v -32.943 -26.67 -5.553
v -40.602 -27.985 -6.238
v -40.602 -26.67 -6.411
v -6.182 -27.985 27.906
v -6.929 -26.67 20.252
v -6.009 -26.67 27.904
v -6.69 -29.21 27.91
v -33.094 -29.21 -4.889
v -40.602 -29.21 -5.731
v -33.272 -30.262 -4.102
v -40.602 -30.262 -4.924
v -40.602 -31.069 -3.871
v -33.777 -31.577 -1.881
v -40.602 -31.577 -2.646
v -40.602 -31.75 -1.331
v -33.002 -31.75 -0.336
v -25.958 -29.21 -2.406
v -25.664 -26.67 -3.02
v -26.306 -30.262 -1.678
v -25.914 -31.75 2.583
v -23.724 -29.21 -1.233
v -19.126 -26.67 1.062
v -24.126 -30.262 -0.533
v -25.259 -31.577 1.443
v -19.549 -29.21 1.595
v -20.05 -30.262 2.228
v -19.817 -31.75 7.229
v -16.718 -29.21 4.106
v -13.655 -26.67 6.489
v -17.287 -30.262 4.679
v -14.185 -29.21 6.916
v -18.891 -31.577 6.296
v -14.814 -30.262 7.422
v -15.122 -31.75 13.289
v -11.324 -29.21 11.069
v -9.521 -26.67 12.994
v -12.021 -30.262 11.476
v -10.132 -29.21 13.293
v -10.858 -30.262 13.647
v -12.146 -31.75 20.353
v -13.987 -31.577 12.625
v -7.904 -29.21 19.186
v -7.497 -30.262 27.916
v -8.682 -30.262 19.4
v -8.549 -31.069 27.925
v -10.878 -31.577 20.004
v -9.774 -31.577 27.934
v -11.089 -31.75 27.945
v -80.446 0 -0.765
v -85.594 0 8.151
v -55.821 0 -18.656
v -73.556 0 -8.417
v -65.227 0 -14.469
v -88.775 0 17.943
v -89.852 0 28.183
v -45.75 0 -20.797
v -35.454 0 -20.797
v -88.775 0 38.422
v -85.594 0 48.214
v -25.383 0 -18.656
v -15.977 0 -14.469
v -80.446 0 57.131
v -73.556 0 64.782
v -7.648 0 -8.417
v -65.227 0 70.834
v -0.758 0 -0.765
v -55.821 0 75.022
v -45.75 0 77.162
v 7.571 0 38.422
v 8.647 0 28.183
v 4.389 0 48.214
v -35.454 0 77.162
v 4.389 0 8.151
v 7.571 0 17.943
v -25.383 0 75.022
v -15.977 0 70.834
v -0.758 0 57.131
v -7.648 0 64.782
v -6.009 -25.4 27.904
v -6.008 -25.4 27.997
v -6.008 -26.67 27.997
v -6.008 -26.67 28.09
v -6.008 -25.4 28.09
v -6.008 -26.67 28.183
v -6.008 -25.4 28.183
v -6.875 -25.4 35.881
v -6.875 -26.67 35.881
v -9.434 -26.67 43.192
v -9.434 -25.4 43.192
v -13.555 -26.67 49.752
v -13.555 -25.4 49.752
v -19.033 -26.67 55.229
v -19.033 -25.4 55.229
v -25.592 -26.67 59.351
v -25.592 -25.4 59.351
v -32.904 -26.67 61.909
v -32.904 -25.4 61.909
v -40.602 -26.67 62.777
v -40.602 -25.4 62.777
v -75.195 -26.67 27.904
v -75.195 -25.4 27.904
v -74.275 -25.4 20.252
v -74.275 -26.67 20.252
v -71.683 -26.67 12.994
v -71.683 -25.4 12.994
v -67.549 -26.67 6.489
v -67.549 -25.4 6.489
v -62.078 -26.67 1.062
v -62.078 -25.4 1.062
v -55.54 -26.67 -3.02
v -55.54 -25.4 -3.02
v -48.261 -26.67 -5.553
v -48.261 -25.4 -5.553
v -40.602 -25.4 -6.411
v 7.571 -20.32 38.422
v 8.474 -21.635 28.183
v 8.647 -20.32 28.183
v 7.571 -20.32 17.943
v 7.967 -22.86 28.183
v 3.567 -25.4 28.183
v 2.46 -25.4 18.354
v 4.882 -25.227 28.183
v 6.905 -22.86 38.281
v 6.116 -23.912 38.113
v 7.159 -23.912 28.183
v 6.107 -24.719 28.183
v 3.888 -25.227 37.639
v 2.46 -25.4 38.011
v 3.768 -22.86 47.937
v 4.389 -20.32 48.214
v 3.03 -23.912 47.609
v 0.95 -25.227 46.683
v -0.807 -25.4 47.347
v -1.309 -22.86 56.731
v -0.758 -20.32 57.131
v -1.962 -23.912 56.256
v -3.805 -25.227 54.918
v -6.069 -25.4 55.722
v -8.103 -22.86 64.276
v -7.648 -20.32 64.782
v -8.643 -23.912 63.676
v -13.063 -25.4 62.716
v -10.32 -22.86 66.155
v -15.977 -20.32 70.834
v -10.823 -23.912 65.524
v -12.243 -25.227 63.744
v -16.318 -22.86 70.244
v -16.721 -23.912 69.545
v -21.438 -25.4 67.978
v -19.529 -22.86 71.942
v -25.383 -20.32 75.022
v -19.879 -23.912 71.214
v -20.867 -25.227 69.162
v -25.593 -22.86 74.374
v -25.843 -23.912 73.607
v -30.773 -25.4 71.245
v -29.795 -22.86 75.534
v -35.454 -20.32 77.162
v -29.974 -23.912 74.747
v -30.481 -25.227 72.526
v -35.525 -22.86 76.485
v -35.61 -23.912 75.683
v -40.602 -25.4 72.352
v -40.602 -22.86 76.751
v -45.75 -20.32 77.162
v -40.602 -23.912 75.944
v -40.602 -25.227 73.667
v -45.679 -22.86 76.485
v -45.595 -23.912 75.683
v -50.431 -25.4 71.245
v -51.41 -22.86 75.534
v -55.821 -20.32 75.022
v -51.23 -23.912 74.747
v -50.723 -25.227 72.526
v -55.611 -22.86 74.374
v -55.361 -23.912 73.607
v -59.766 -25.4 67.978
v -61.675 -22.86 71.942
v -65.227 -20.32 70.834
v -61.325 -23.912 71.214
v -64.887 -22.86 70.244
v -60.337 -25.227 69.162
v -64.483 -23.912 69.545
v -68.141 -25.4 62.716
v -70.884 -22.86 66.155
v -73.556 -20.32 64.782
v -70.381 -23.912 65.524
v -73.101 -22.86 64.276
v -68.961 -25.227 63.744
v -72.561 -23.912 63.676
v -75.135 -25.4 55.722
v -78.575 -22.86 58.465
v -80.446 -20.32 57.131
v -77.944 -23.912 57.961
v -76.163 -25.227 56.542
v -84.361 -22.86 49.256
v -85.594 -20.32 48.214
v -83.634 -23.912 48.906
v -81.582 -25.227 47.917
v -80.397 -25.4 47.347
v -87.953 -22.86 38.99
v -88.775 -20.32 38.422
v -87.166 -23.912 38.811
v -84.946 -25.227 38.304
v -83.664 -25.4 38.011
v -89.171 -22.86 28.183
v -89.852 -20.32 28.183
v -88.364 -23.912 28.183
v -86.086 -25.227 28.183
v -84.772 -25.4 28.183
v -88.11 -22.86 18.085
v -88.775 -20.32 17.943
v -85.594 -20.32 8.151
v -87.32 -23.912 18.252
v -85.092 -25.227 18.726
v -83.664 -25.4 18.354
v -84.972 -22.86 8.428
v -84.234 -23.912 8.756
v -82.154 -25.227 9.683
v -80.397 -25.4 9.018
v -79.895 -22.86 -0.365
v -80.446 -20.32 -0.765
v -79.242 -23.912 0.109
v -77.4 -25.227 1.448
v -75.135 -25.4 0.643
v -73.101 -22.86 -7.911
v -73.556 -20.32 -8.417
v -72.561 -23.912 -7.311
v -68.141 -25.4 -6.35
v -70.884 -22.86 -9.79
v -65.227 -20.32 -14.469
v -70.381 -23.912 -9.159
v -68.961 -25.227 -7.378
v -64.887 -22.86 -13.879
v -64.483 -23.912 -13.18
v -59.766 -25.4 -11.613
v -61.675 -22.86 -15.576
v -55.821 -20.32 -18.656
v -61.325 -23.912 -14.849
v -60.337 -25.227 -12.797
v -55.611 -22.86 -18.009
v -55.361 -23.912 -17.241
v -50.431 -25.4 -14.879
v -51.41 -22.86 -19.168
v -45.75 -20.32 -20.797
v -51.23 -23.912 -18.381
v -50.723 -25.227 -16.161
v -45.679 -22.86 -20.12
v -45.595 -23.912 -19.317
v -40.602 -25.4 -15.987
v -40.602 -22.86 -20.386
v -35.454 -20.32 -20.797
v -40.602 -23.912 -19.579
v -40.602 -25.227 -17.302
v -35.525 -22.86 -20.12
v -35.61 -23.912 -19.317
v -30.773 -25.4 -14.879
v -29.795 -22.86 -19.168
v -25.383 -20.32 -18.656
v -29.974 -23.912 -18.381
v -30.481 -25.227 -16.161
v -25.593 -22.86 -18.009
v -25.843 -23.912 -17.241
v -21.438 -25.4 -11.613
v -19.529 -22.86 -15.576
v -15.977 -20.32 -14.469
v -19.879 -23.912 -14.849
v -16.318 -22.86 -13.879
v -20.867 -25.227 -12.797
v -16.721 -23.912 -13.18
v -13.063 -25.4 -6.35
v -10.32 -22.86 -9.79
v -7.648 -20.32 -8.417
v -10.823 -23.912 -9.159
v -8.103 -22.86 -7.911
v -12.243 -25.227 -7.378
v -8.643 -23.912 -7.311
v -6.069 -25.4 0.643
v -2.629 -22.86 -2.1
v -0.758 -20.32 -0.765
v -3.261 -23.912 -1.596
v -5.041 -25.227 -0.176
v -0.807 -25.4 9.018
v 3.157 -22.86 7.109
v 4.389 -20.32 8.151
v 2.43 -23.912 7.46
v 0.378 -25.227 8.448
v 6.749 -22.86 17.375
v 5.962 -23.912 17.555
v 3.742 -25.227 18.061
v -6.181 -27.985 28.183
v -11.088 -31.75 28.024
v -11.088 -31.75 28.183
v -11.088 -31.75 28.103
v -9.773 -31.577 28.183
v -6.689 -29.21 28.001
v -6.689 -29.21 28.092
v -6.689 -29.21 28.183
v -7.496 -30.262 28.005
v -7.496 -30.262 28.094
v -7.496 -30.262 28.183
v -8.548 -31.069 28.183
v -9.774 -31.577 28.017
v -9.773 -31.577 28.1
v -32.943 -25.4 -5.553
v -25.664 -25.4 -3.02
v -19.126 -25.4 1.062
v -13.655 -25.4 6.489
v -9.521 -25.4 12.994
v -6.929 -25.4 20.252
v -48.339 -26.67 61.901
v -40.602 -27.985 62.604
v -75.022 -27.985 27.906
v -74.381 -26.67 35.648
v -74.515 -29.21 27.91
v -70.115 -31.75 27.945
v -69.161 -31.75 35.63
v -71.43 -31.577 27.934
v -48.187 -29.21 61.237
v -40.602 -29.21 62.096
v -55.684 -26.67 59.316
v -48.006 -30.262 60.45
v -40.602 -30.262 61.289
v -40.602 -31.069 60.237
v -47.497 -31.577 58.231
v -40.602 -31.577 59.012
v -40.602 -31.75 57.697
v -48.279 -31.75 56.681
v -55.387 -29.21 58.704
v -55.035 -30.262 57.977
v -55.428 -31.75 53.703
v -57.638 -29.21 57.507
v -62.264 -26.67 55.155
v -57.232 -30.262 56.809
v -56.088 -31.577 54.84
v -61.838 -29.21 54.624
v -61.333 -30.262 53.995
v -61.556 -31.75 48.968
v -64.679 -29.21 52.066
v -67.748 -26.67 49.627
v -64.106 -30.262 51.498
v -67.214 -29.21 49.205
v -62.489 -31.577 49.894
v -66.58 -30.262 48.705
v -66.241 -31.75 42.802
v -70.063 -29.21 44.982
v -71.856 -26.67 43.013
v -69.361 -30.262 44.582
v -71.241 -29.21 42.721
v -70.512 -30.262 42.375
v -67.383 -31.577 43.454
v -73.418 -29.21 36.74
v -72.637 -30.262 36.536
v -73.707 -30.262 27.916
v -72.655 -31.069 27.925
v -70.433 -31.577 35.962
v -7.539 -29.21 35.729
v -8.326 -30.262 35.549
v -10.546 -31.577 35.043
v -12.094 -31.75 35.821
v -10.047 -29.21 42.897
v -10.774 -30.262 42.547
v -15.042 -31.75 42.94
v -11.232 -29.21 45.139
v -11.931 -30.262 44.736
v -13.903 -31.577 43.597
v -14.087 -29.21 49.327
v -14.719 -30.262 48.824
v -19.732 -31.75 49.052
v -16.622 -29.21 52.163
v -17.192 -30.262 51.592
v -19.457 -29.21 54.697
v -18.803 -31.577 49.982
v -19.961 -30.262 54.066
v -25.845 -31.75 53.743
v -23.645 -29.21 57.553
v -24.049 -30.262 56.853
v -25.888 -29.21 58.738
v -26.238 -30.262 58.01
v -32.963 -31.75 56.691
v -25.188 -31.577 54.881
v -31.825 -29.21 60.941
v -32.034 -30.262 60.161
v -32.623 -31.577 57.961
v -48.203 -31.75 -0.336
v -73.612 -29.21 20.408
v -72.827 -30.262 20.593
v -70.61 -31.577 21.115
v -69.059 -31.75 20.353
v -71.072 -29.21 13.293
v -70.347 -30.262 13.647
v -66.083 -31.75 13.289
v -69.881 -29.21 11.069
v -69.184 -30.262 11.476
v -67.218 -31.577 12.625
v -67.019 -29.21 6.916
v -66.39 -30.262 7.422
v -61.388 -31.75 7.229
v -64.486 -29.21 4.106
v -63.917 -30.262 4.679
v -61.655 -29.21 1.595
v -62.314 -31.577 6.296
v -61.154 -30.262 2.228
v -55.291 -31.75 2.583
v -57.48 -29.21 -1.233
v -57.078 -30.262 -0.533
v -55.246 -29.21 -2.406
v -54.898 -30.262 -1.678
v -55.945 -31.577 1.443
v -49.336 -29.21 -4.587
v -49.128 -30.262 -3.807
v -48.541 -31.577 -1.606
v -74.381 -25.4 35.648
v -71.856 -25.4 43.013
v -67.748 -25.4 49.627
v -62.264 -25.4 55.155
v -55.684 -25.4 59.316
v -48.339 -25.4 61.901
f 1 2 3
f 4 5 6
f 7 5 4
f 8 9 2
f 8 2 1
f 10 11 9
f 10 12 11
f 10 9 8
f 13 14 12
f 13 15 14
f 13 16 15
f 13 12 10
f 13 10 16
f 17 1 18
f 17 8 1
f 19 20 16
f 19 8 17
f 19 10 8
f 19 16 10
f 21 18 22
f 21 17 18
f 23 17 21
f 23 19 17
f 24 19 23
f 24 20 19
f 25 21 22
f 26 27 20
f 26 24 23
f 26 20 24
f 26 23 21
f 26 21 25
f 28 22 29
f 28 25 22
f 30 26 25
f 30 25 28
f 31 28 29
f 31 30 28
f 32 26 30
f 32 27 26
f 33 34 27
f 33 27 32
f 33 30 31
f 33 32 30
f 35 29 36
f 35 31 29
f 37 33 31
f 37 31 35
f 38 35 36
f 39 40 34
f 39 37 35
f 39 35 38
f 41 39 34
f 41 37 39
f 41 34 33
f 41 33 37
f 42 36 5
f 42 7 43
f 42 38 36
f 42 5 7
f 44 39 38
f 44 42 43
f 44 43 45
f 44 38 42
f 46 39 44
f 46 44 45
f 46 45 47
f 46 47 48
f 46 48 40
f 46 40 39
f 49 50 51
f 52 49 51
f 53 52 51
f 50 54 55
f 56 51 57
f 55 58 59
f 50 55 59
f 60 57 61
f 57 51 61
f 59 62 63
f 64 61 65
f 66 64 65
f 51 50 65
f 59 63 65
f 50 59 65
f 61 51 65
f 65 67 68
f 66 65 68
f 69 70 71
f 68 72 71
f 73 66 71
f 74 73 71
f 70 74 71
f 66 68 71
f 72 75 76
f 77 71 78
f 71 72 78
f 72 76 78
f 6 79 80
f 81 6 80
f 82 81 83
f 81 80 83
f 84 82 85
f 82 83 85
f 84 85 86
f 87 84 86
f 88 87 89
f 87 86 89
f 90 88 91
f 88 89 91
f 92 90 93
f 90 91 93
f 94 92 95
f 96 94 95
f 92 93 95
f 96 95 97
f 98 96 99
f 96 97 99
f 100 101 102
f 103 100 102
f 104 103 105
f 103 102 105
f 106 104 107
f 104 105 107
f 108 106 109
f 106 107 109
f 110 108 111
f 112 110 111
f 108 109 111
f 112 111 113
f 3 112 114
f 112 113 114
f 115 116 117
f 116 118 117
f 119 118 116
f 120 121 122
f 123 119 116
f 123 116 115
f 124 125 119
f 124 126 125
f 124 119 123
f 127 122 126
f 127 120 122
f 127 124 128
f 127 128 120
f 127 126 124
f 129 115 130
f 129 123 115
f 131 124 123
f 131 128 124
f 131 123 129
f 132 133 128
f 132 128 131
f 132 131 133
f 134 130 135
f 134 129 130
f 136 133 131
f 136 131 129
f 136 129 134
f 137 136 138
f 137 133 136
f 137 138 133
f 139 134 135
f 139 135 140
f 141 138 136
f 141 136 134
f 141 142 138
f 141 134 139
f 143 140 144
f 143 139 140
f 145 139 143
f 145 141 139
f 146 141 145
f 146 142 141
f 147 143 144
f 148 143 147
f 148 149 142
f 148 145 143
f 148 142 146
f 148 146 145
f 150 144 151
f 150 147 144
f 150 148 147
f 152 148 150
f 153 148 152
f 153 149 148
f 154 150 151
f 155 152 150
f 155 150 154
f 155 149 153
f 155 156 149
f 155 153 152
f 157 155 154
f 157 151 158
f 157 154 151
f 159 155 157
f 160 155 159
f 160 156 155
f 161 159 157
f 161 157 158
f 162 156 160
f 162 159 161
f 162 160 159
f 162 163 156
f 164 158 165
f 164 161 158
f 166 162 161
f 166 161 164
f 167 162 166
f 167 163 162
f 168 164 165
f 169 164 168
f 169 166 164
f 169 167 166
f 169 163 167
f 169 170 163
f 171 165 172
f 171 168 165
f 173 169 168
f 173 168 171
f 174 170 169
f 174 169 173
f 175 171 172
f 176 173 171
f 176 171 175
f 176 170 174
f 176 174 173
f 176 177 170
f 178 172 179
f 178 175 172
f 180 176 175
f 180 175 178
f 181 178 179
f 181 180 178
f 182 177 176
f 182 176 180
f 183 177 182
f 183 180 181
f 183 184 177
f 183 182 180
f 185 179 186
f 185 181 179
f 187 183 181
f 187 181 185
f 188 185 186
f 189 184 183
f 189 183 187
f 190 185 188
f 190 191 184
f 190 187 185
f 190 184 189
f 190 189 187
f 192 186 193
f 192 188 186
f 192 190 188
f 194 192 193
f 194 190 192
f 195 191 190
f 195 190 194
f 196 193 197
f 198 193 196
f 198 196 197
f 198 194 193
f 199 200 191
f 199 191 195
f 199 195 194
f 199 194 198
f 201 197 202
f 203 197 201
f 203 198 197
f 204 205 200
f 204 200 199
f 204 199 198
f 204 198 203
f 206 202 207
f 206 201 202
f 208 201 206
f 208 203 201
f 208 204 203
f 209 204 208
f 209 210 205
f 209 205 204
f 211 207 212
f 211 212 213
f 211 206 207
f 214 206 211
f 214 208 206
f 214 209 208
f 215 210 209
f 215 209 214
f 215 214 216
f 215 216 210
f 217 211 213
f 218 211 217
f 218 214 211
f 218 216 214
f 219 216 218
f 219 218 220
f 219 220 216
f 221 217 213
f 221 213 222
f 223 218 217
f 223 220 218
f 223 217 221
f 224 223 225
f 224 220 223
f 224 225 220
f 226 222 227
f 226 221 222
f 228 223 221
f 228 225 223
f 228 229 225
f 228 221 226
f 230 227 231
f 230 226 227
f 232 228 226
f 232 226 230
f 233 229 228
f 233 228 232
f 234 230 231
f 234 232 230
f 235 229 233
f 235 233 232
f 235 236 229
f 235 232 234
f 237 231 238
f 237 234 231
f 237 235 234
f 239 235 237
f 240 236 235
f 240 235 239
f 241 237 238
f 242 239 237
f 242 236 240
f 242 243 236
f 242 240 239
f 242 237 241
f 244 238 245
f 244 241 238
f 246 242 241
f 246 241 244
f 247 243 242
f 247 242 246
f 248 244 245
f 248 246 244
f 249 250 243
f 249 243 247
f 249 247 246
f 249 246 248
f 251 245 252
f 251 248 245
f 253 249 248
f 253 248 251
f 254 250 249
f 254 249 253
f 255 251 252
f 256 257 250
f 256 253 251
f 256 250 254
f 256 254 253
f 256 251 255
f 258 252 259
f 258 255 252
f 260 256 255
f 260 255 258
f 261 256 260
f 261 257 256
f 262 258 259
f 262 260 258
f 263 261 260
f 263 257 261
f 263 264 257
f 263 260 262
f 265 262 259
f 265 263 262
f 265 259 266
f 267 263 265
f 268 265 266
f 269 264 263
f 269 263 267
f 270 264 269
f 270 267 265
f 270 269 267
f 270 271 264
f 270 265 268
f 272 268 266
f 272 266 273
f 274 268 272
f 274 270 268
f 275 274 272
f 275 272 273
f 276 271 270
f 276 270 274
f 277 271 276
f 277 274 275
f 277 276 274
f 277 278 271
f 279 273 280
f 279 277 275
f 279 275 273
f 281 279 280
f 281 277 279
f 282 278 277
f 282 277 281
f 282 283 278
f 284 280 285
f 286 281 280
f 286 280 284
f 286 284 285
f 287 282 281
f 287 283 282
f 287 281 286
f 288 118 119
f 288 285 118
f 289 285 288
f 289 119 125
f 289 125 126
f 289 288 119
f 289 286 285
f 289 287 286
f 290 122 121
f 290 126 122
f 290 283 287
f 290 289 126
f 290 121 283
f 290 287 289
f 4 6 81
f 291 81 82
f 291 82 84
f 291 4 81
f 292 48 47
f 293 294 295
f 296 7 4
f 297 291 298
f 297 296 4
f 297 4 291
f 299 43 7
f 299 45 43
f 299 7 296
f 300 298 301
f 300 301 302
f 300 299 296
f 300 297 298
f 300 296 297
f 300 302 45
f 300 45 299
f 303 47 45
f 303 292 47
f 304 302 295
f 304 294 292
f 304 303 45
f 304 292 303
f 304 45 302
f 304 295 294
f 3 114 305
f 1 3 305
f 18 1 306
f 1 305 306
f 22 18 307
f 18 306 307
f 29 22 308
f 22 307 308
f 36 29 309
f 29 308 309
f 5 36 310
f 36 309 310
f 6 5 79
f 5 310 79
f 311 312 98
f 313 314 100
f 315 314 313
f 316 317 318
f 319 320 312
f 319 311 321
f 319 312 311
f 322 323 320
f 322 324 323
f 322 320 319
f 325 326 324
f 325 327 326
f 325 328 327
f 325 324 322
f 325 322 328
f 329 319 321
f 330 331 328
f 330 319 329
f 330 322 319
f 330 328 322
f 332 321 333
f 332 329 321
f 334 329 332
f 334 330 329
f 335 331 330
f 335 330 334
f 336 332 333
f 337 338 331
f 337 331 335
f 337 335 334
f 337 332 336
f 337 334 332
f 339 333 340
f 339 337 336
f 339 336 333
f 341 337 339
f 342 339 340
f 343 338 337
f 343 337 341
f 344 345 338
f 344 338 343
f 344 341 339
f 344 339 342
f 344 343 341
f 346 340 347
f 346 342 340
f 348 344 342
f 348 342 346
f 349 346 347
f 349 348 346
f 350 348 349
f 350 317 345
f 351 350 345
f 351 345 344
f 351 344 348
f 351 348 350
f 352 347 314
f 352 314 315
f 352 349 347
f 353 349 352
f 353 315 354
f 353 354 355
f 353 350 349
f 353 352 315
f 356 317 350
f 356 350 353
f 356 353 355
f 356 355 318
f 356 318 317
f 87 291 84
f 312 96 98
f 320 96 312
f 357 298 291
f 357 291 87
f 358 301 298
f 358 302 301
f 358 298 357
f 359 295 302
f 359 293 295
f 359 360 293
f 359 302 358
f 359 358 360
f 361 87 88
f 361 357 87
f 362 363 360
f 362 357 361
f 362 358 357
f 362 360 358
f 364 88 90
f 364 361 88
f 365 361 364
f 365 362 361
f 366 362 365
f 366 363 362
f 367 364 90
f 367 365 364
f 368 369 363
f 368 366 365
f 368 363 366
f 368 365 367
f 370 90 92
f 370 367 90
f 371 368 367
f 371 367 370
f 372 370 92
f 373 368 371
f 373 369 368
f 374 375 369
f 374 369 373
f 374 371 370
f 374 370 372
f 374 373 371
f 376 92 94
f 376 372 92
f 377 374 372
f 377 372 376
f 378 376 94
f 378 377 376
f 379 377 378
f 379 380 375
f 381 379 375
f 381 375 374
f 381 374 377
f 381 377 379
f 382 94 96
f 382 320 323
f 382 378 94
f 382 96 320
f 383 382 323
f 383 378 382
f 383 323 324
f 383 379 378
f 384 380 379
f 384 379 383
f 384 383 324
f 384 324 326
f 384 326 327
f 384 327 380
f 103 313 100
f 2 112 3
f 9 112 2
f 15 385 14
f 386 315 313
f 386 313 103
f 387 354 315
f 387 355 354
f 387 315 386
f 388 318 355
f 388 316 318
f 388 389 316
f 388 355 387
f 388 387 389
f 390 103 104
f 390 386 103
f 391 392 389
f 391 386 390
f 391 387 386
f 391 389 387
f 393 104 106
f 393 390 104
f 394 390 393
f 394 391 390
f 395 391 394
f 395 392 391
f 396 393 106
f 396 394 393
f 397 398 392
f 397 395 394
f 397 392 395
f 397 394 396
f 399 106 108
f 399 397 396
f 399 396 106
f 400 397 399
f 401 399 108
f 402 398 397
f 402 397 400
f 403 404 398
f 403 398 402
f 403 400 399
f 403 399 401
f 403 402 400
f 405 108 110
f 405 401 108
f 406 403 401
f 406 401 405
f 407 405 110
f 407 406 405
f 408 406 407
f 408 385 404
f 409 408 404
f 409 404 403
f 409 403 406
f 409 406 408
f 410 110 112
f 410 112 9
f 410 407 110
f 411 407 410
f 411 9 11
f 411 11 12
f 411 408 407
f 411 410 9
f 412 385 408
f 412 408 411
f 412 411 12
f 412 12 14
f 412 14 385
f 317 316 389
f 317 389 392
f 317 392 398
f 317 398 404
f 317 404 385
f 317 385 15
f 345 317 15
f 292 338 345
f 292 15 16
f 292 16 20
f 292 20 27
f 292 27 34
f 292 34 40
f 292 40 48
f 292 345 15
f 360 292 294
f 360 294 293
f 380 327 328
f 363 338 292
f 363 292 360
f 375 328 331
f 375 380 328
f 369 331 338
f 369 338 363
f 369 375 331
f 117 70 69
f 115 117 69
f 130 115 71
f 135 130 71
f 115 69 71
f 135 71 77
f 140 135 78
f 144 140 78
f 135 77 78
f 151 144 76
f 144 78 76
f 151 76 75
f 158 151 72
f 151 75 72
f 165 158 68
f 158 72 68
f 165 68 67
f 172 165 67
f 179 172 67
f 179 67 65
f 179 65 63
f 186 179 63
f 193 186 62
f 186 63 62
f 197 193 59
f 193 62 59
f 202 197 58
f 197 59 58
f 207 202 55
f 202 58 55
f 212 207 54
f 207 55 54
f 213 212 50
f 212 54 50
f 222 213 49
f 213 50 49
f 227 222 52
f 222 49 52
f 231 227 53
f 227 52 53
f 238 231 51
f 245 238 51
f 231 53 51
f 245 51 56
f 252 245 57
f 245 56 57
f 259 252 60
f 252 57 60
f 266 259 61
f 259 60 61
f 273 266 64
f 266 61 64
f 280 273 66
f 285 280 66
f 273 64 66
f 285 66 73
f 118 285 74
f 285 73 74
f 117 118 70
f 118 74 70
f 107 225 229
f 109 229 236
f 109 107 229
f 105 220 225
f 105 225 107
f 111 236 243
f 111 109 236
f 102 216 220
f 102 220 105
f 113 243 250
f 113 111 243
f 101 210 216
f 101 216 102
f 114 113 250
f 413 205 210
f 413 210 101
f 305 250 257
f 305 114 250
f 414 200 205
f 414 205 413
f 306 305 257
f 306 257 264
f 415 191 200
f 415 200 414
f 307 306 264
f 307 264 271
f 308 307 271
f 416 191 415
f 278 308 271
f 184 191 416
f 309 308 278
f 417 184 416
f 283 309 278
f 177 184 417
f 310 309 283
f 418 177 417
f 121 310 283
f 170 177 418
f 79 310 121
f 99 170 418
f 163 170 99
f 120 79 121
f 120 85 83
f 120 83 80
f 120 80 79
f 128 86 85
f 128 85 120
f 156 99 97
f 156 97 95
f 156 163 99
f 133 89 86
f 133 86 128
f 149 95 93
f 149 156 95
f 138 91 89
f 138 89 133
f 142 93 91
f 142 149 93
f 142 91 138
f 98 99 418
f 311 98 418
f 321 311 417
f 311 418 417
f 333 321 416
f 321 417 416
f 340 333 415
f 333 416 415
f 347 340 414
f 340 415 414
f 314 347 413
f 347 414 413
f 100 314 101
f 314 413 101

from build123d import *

# Parameters (mm, degrees)
F1_DEPTH = 31.75
F0_R     = 49.2494250879
F2_DEPTH = 25.4
F3_R     = 5.08


with BuildPart() as f1:
    # F0 (on Front) → F1 (new body)
    with BuildSketch(Plane.XZ):
        with BuildLine():
            Line((-40.602091343, 27.9041671834), (-75.195086289, 27.9041671834))
            ThreePointArc((-75.195086289, 27.9041671834), (-64.9651755745, 3.6226405346), (-40.602091343, -6.4114880449))
            Line((-40.602091343, -6.4114880449), (-40.602091343, 27.9041671834))
        make_face()
        with BuildLine():
            Line((-40.602091343, 28.1826276332), (-40.602091343, 62.7767433114))
            ThreePointArc((-40.602091343, 62.7767433114), (-65.1620784416, 52.5457118647), (-75.195086289, 27.9041671834))
            Line((-75.195086289, 27.9041671834), (-40.602091343, 27.9041671834))
            Line((-40.602091343, 27.9041671834), (-40.602091343, 28.1826276332))
        make_face()
        with BuildLine():
            ThreePointArc((-6.0090963971, 27.9041671834), (-6.0082558491, 28.0433962806), (-6.0079756649, 28.1826276332))
            ThreePointArc((-6.0079756649, 28.1826276332), (-16.1403575579, 52.6443614184), (-40.602091343, 62.7767433114))
            Line((-40.602091343, 62.7767433114), (-40.602091343, 28.1826276332))
            Line((-40.602091343, 28.1826276332), (-40.602091343, 27.9041671834))
            Line((-40.602091343, 27.9041671834), (-6.0090963971, 27.9041671834))
        make_face()
        with BuildLine():
            ThreePointArc((-40.602091343, -6.4114880449), (-16.2390071116, 3.6226405346), (-6.0090963971, 27.9041671834))
            Line((-6.0090963971, 27.9041671834), (-40.602091343, 27.9041671834))
            Line((-40.602091343, 27.9041671834), (-40.602091343, -6.4114880449))
        make_face()
    extrude(amount=F1_DEPTH)

    # F0 (on Front) → F2 (join)
    with BuildSketch(Plane.XZ):
        with Locations((-40.602091343, 28.1826276332)):
            Circle(F0_R)
        with BuildLine():
            ThreePointArc((-40.602091343, 62.7767433114), (-16.1403575579, 52.6443614184), (-6.0079756649, 28.1826276332))
            ThreePointArc((-6.0079756649, 28.1826276332), (-6.0082558491, 28.0433962806), (-6.0090963971, 27.9041671834))
            ThreePointArc((-6.0090963971, 27.9041671834), (-16.2390071116, 3.6226405346), (-40.602091343, -6.4114880449))
            ThreePointArc((-40.602091343, -6.4114880449), (-64.9651755745, 3.6226405346), (-75.195086289, 27.9041671834))
            ThreePointArc((-75.195086289, 27.9041671834), (-65.1620784416, 52.5457118647), (-40.602091343, 62.7767433114))
        make_face(mode=Mode.SUBTRACT)
    extrude(amount=F2_DEPTH)

    # F3
    f3_edges = [f1.edges().sort_by_distance(p)[0] for p in [
        (-40.602091, -31.75, 62.776743),
        (-89.851516, -25.4, 28.182628),
    ]]
    fillet(f3_edges, radius=F3_R)


solid = f1.part
